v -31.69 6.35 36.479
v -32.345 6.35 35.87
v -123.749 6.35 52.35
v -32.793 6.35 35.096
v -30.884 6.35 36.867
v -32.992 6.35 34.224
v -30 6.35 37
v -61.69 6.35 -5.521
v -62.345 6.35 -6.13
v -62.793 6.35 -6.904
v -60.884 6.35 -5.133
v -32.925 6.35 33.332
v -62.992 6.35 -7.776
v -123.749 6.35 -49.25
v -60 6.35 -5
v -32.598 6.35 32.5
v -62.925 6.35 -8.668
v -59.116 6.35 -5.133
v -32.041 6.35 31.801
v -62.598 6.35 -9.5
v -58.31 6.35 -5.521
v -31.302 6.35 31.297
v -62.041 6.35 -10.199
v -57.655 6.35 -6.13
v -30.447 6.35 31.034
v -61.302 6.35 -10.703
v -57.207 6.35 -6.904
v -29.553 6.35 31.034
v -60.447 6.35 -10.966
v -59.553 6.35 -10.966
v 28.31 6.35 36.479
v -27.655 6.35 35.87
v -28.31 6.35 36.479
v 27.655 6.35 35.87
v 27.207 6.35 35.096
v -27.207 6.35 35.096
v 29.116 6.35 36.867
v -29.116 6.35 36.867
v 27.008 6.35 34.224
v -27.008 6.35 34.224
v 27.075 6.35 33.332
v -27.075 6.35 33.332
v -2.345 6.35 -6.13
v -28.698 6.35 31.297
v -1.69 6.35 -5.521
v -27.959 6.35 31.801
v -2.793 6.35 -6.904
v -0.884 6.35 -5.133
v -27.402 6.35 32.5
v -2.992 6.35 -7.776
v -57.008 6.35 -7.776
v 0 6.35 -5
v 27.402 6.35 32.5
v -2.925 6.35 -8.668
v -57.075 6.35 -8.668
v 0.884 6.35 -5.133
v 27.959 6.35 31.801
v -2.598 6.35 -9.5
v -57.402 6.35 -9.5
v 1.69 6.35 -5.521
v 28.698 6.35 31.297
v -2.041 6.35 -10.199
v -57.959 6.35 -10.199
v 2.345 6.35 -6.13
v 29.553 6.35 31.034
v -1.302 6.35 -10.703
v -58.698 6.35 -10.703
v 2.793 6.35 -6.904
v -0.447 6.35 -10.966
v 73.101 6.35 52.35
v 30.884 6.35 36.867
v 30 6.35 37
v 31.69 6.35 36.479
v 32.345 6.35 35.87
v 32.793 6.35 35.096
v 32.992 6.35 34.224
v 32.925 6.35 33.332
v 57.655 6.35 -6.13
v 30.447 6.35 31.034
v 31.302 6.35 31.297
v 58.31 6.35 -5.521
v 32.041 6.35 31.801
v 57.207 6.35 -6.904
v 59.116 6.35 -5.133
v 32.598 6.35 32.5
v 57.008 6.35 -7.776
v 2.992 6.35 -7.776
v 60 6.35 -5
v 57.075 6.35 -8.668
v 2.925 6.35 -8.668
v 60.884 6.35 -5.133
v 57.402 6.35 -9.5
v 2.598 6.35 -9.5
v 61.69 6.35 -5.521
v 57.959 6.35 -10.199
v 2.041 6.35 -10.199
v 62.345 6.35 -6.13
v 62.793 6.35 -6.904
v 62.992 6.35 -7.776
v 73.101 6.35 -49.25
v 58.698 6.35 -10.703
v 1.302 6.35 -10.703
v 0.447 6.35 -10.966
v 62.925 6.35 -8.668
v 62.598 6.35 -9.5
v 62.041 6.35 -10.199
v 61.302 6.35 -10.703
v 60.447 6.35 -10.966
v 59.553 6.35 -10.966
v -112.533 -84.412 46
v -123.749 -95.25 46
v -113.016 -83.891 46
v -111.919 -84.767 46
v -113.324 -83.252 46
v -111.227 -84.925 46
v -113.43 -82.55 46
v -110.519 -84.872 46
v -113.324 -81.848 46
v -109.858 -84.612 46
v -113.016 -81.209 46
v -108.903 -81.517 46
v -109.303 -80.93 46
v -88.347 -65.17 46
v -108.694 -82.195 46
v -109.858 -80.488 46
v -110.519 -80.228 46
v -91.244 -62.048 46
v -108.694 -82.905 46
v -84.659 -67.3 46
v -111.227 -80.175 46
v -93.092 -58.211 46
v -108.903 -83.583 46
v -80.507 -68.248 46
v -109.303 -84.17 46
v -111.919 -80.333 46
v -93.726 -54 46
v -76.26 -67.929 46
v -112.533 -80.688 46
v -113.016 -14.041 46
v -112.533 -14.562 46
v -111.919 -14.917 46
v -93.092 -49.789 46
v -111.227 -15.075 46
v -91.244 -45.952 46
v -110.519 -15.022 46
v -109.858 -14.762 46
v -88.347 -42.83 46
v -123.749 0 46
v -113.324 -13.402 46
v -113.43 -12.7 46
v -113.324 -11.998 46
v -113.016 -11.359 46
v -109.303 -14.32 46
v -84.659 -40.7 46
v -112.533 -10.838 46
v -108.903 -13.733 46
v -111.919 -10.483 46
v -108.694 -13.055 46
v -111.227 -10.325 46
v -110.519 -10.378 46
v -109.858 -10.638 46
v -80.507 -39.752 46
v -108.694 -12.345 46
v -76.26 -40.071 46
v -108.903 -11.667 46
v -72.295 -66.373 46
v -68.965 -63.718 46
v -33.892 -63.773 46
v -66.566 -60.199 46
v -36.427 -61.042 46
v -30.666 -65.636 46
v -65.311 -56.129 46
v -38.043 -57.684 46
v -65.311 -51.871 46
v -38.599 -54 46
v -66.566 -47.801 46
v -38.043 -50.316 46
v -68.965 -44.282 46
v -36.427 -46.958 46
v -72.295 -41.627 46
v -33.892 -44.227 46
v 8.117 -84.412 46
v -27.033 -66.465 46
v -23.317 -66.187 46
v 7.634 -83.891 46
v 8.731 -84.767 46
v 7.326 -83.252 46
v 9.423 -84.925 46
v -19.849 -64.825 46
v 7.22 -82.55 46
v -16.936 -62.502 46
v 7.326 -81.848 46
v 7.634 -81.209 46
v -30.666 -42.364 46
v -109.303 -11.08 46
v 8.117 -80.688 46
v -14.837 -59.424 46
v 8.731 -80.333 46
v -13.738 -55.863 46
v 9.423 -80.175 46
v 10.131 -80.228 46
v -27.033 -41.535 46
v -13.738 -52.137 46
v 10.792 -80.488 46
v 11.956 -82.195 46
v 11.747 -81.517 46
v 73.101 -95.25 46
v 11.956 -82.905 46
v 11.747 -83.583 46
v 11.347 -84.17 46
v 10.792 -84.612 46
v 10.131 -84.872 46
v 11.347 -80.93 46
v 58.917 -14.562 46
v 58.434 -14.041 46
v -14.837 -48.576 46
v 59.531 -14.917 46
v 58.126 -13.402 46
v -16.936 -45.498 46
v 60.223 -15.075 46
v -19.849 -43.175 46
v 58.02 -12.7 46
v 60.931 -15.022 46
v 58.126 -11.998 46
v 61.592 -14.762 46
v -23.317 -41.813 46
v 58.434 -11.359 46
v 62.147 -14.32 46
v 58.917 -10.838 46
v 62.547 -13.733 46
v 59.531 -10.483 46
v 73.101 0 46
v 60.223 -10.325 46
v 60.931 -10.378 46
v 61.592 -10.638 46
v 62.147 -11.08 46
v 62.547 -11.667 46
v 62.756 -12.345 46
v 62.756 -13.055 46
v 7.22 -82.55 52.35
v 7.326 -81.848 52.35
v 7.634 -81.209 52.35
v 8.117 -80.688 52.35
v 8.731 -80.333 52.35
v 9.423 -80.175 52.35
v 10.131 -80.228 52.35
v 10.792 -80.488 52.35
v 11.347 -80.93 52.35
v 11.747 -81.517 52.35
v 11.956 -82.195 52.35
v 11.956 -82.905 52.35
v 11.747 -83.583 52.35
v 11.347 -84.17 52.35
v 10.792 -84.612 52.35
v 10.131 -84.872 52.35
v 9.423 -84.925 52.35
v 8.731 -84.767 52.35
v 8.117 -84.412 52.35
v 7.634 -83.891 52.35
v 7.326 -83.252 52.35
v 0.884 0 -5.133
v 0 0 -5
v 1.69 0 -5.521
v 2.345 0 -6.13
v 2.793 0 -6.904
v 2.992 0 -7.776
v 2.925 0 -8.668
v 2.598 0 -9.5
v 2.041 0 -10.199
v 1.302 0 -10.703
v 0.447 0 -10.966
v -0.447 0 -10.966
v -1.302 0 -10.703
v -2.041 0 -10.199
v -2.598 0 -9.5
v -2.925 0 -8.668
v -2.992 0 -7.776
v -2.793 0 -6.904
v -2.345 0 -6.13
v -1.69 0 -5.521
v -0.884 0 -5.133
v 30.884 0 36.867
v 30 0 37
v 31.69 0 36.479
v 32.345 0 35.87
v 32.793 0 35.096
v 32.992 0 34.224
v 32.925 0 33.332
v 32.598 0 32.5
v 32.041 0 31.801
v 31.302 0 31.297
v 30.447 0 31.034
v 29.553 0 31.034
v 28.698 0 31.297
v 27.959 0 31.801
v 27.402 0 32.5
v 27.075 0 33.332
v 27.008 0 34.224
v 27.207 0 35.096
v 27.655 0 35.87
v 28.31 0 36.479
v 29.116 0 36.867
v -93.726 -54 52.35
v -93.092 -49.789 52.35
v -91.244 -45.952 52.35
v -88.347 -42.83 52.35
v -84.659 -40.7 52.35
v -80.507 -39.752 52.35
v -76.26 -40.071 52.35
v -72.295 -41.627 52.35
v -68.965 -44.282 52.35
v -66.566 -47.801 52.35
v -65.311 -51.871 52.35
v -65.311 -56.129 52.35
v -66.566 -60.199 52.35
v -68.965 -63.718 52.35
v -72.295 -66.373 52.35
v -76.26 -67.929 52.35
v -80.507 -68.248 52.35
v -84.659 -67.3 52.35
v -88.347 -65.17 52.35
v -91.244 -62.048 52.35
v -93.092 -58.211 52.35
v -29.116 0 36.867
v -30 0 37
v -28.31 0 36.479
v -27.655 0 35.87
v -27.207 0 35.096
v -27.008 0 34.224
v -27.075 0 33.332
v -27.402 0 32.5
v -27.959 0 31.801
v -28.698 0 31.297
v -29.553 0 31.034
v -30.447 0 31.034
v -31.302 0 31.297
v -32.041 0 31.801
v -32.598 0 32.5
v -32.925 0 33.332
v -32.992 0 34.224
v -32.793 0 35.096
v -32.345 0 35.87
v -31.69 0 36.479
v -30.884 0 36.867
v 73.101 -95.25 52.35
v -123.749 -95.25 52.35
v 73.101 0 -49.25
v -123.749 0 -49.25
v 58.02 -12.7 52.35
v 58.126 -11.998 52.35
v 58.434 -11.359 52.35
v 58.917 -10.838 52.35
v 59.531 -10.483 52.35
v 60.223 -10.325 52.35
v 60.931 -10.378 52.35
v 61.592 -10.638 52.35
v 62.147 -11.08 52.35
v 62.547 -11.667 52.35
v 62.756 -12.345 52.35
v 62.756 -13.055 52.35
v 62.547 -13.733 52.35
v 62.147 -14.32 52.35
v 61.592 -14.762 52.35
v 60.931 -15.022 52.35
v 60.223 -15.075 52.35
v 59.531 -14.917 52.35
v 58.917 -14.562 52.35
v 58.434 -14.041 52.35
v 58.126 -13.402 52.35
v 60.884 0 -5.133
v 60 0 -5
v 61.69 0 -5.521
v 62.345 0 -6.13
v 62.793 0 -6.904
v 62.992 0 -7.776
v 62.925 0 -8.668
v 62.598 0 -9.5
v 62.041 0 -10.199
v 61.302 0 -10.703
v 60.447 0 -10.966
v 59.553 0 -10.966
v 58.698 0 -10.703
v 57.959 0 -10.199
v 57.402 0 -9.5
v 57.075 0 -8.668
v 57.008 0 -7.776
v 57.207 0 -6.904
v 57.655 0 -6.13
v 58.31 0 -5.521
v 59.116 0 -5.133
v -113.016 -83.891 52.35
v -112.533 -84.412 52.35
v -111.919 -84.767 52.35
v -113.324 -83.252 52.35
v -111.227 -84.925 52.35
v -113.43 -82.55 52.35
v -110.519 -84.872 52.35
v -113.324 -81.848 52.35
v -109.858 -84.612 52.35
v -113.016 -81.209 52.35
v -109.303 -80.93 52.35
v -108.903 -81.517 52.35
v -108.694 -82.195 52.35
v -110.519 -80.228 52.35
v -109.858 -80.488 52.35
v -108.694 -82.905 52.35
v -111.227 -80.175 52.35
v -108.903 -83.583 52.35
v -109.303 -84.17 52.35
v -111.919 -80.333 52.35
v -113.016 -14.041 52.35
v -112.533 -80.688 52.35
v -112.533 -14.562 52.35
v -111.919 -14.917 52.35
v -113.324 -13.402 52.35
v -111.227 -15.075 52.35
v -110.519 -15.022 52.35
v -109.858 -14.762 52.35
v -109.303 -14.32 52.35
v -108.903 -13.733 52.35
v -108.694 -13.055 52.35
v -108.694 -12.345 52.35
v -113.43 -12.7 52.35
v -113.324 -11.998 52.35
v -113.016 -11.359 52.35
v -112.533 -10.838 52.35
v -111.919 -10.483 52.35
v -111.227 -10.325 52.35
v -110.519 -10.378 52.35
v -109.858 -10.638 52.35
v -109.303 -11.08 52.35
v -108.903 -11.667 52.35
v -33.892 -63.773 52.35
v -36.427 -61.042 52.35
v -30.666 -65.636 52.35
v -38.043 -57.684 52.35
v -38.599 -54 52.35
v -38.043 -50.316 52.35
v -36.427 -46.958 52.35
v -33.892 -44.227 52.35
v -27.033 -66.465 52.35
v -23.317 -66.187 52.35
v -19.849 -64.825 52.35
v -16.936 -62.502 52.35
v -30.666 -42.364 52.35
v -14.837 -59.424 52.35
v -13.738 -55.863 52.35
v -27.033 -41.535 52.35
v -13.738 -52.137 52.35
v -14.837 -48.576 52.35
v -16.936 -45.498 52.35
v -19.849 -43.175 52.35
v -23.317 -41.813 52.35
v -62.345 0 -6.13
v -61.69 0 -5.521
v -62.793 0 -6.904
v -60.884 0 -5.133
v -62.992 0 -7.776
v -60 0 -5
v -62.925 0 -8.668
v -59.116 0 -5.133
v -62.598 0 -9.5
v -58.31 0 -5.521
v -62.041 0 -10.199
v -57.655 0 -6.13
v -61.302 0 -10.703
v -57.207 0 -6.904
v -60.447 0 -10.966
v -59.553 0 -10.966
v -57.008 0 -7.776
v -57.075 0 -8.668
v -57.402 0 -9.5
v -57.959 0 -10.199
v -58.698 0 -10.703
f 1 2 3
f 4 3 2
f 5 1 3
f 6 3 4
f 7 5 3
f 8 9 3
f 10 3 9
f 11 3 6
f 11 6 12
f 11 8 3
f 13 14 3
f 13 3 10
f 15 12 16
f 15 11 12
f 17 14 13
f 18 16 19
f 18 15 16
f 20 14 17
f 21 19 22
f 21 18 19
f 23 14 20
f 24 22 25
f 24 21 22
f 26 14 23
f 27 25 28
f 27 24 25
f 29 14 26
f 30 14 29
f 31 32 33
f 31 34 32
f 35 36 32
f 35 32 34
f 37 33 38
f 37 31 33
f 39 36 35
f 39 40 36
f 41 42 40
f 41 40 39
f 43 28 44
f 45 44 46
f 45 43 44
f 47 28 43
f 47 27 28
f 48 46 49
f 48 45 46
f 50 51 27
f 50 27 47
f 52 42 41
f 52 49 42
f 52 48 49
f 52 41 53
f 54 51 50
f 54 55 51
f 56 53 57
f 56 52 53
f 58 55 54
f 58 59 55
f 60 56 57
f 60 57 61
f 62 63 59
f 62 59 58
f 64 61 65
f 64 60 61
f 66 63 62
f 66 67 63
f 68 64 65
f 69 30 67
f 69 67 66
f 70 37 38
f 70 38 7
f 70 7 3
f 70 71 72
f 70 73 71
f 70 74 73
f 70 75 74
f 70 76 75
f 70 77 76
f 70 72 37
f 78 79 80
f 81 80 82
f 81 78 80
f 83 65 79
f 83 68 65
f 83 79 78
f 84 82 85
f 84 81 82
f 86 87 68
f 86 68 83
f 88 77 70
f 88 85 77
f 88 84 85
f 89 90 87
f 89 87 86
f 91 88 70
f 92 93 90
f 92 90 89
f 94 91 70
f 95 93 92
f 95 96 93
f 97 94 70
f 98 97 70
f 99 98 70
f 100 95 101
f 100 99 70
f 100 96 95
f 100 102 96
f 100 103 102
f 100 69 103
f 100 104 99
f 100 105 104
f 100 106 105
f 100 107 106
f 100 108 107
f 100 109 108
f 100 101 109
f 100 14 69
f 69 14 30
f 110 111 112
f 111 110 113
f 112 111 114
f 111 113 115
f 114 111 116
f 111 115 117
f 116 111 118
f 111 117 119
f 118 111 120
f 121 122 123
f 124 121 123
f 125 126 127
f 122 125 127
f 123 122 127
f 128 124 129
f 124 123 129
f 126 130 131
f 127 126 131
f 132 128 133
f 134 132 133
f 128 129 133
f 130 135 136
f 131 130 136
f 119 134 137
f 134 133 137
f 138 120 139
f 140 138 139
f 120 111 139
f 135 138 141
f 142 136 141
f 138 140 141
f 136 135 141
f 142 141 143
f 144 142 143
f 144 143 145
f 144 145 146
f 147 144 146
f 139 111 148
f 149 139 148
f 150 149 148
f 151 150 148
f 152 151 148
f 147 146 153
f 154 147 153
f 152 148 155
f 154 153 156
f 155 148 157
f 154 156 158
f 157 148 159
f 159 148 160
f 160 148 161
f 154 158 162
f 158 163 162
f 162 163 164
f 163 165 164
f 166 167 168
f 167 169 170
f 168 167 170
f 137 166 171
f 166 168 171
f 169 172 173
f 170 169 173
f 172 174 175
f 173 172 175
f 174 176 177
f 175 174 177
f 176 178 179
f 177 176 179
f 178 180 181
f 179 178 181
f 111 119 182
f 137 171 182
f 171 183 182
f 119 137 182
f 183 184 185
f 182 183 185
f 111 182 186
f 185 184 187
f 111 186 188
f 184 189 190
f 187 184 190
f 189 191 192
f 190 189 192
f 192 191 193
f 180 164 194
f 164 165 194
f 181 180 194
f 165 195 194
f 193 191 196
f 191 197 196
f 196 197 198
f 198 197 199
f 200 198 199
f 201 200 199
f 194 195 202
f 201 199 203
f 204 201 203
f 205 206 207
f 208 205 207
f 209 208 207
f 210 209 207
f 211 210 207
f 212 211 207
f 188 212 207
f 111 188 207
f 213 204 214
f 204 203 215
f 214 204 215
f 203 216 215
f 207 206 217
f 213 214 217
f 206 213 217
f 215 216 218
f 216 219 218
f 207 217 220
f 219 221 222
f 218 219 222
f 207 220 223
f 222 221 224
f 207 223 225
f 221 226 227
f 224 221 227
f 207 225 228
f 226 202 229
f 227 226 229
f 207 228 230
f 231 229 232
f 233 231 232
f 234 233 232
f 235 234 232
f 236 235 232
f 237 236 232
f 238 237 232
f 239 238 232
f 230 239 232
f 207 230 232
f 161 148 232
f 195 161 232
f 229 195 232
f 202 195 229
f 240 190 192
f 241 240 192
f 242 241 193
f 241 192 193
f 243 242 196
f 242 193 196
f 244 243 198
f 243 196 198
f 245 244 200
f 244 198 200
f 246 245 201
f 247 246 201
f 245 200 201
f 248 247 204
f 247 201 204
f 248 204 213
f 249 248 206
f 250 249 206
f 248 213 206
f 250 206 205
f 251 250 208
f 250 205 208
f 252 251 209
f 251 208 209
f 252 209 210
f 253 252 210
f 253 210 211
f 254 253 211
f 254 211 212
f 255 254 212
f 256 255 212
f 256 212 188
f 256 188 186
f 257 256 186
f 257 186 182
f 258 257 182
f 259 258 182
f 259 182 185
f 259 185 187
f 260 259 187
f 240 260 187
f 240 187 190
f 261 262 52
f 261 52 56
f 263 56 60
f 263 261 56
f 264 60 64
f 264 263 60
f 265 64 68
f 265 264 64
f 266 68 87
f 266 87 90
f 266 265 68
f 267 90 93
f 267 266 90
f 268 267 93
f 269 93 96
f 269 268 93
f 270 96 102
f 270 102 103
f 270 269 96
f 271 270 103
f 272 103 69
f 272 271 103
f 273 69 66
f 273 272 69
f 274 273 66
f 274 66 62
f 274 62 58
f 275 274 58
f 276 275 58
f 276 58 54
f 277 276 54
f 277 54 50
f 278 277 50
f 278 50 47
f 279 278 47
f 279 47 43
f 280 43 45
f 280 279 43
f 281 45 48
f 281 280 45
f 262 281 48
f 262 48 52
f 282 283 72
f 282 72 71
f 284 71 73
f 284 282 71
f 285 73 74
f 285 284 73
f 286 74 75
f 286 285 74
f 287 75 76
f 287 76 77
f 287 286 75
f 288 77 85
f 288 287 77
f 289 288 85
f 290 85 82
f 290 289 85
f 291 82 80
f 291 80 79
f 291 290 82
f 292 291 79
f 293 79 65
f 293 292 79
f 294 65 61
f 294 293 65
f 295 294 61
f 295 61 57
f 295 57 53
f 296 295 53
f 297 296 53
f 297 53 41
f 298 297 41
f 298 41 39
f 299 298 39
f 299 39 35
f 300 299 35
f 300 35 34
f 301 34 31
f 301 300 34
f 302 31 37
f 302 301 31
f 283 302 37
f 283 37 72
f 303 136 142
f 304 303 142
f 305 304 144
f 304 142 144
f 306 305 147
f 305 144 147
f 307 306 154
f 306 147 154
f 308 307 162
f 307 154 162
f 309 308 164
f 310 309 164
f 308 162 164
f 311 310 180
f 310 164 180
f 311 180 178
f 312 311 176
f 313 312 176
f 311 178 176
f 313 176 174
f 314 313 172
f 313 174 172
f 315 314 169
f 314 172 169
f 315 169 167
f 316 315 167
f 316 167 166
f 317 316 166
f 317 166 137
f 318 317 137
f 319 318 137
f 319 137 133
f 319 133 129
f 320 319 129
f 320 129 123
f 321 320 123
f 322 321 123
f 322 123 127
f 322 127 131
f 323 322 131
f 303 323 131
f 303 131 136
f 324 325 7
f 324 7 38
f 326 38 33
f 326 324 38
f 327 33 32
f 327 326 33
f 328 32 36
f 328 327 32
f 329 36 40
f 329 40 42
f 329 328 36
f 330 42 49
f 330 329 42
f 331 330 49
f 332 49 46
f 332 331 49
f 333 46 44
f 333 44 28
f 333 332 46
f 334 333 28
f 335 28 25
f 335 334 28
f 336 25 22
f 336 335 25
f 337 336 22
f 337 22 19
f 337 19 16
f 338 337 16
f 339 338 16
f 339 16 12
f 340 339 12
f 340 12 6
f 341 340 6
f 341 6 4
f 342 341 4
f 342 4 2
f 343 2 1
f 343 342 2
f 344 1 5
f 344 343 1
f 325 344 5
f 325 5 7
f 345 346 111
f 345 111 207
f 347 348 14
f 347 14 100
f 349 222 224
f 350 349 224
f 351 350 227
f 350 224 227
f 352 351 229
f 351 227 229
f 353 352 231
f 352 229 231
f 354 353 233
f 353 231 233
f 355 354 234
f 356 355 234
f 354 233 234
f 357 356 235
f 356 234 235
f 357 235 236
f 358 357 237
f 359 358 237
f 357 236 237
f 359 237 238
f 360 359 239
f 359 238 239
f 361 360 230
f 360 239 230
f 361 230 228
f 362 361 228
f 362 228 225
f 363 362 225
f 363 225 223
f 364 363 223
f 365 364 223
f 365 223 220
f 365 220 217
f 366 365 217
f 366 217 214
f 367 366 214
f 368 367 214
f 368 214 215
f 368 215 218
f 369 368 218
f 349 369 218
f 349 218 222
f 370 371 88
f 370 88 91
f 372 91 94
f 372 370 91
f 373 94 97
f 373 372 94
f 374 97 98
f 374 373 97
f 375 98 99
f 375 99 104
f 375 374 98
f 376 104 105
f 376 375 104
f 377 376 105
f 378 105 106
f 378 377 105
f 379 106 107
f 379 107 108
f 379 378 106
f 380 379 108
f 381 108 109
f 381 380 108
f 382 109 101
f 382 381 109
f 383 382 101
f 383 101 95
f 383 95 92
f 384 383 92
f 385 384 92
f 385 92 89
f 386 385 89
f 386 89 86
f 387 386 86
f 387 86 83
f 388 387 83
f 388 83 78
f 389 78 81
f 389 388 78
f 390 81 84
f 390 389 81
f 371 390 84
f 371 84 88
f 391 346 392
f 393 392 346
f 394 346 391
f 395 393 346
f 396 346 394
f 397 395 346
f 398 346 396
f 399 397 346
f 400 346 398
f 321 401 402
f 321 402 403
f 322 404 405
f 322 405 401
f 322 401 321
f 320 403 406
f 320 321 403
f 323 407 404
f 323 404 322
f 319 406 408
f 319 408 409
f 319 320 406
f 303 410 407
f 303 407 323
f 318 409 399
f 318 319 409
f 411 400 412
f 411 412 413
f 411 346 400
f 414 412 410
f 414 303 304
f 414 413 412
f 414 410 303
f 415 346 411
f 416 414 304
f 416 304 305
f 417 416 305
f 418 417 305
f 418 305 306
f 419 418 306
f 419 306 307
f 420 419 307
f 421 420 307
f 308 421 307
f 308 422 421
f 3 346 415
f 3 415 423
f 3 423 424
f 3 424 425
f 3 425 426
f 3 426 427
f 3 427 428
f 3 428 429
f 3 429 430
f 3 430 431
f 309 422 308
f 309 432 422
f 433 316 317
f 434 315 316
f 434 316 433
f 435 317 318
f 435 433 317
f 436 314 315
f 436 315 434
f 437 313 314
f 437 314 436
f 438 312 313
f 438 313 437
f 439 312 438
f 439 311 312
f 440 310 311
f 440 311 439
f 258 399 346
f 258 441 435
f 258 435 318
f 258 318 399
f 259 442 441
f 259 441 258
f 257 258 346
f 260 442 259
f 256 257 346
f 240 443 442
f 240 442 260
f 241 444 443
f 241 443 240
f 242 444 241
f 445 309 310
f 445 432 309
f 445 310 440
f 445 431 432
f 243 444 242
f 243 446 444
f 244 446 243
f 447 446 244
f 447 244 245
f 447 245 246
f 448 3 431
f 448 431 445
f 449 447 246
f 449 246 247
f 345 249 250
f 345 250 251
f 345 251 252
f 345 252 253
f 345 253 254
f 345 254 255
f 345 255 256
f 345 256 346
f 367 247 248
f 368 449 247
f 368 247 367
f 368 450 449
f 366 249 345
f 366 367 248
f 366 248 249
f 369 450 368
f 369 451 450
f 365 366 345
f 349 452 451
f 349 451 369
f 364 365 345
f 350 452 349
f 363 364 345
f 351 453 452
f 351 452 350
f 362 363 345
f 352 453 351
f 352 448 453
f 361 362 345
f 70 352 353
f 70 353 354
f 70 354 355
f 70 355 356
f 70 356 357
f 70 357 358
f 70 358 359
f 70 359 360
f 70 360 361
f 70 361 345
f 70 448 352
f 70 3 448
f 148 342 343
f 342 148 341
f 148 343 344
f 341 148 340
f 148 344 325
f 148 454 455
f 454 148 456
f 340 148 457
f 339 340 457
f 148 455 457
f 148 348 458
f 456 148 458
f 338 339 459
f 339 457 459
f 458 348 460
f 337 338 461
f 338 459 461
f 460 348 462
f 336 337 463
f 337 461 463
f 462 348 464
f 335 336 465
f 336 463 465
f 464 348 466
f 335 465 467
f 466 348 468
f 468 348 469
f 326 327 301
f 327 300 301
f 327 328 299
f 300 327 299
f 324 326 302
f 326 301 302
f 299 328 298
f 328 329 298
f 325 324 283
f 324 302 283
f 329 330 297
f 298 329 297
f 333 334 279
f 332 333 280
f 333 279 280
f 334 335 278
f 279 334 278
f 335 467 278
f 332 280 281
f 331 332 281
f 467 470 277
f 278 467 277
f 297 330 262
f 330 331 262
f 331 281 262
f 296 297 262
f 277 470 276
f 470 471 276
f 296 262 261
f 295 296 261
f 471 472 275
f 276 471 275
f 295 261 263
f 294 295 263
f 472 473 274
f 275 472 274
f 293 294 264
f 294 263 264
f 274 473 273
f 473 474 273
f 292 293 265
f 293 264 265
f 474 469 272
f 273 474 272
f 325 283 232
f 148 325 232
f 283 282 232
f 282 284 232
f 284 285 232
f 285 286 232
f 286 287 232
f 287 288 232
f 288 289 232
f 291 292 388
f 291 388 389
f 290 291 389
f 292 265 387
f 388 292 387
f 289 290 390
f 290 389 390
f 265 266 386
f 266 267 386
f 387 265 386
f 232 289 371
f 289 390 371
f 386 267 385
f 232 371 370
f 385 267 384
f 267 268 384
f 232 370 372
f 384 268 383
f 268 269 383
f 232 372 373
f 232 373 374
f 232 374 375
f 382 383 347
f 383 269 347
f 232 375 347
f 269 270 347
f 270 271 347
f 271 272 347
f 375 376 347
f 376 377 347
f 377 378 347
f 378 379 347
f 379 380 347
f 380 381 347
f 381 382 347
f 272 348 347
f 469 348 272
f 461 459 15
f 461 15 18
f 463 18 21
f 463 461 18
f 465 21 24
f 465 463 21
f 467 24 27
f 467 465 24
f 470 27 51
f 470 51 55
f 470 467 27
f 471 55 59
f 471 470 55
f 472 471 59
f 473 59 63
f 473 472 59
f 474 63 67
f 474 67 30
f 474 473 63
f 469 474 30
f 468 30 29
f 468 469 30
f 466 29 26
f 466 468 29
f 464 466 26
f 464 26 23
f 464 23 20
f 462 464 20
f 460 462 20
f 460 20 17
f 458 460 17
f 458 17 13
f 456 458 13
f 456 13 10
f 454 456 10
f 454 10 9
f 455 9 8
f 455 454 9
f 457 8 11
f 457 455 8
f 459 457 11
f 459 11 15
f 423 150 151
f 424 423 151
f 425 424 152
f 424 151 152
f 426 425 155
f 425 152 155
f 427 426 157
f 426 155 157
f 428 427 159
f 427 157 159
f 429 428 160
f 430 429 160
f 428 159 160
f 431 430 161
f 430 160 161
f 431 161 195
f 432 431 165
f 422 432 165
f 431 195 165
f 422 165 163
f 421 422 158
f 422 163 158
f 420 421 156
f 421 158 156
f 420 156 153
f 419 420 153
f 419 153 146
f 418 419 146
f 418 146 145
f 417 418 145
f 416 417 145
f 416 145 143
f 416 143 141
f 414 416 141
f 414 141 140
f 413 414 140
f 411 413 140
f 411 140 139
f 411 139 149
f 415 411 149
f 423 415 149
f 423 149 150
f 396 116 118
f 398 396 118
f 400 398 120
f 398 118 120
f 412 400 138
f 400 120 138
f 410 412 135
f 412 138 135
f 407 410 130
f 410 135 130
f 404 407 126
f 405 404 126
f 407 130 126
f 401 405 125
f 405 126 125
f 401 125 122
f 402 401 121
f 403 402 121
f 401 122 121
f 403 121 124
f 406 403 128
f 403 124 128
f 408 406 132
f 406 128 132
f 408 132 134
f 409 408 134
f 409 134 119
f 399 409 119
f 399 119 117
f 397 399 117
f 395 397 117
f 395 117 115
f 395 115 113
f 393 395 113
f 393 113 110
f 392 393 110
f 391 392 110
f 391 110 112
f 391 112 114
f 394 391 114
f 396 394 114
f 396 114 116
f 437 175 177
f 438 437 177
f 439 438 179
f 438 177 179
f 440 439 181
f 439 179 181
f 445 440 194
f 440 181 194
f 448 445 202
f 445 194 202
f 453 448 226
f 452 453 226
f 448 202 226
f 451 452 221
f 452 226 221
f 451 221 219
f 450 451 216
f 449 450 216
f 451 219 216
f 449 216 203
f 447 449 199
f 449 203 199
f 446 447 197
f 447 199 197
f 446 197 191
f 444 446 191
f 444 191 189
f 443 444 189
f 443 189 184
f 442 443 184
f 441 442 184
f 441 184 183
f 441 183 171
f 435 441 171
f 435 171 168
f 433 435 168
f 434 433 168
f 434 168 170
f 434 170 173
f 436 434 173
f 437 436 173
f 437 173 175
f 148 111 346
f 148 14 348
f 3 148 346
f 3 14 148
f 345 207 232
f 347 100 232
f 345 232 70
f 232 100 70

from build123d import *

# Parameters (mm, degrees)
SKETCH1_W           = 196.85
SKETCH1_H           = 101.6
SKETCH1_R           = 2.999999969
BOSS_EXTRUDE1_DEPTH = 6.35
SKETCH2_W           = 196.85
SKETCH2_H           = 6.35
BOSS_EXTRUDE2_DEPTH = 95.25
SKETCH4_R           = 12.500000019
SKETCH4_R_2         = 2.38125
SKETCH4_R_3         = 14.2875
CUT_EXTRUDE1_DEPTH  = 183.917715111


with BuildPart() as part:
    # Sketch1 → Boss-Extrude1 (new body)
    with BuildSketch(Plane(origin=(0, 0, 0), x_dir=(1, 0, 0), z_dir=(0, 1, 0))):
        with Locations((-25.3238, -1.549999948)):
            Rectangle(SKETCH1_W, SKETCH1_H)
        with Locations((-59.999999888, 8.000000002)):
            Circle(SKETCH1_R, mode=Mode.SUBTRACT)
        with Locations((0, 8.000000002)):
            Circle(SKETCH1_R, mode=Mode.SUBTRACT)
        with Locations((59.999999888, 8.000000002)):
            Circle(SKETCH1_R, mode=Mode.SUBTRACT)
        with Locations((29.999999944, -34.000000072)):
            Circle(SKETCH1_R, mode=Mode.SUBTRACT)
        with Locations((-29.999999944, -34.000000072)):
            Circle(SKETCH1_R, mode=Mode.SUBTRACT)
    extrude(amount=BOSS_EXTRUDE1_DEPTH)

    # Sketch2 → Boss-Extrude2 (add)
    with BuildSketch(Plane.XZ):
        with Locations((-25.3238, 49.174999948)):
            Rectangle(SKETCH2_W, SKETCH2_H)
    extrude(amount=BOSS_EXTRUDE2_DEPTH)

    # Sketch4 → Cut-Extrude1 (cut, through all)
    with BuildSketch(Plane(origin=(0, 0, 45.999999948), x_dir=(-1, 0, 0), z_dir=(0, 0, -1))):
        with Locations((26.098799974, -53.99999995)):
            Circle(SKETCH4_R)
        with Locations((-60.4012, -12.7)):
            Circle(SKETCH4_R_2)
        with Locations((111.0488, -12.7)):
            Circle(SKETCH4_R_2)
        with Locations((111.0488, -82.55)):
            Circle(SKETCH4_R_2)
        with Locations((-9.6012, -82.55)):
            Circle(SKETCH4_R_2)
        with Locations((79.438799974, -53.99999995)):
            Circle(SKETCH4_R_3)
    extrude(amount=-CUT_EXTRUDE1_DEPTH, mode=Mode.SUBTRACT)


solid = part.part
